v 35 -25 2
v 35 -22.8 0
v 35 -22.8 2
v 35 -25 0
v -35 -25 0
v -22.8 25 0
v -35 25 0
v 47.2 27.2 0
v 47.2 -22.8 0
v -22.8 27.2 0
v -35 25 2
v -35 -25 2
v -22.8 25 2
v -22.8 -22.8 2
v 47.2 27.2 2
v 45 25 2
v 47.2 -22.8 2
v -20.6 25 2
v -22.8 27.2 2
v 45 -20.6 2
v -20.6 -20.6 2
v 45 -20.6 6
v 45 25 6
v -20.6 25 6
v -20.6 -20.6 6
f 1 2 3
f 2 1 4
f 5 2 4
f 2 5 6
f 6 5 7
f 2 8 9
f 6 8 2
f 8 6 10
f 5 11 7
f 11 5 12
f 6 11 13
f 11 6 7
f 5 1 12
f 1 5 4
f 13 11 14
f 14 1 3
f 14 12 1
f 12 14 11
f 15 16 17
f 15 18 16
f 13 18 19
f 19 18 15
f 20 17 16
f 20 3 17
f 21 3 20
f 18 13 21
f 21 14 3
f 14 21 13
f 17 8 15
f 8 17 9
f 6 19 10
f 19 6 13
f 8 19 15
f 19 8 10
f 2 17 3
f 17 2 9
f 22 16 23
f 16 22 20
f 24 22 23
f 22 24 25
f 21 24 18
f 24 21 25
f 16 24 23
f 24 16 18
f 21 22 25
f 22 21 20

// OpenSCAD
// Two-part enclosure for small electronics board (e.g. Arduino-based temperature logger)
// Print orientation: box upright, lid upside down on the bed, 10 mm gap between them

// ---------------- Parameters ----------------
box_x      = 70;    // box outer size in X (mm)
box_y      = 50;    // box outer size in Y (mm)
box_z      = 30;    // box outer size in Z (mm)
box_wall   = 2;     // box wall thickness (mm)
box_floor  = 2;     // box floor thickness (mm)

lid_plate_x      = 70;   // lid plate size in X (mm)
lid_plate_y      = 50;   // lid plate size in Y (mm)
lid_plate_t      = 2;    // lid plate thickness (mm)

lip_outer_x      = 65.6; // lip outer size in X (mm)
lip_outer_y      = 45.6; // lip outer size in Y (mm)
lip_wall         = 1.5;  // lip wall thickness (mm)
lip_height       = 4;    // lip height above plate (mm)

clearance        = 0.2;  // clearance between lip inner size and box opening (mm)
gap_between      = 10;   // gap between box and lid (mm)
eps              = 0.5;  // cutter overshoot past faces (mm)

$fn = 64;

// Derived: lip inner size so it slides into the box opening
lip_in_x = box_x - 2*box_wall - 2*clearance;   // 65.6
lip_in_y = box_y - 2*box_wall - 2*clearance;   // 45.6

// ---------------- Model ----------------
union() {
    // Part 1: Box (open top)
    translate([-box_x/2, -box_y/2, 0])
        difference() {
            cube([box_x, box_y, box_z]);
            translate([0, 0, box_floor])
                cube([box_x, box_y, box_z - box_floor + eps]);  // open-top cut
        }

    // Part 2: Lid (plate with lip), printed upside down
    translate([(box_x - lip_outer_x)/2 + gap_between,
               (box_y - lip_outer_y)/2,
               0])
        union() {
            // Plate lying on the bed
            translate([-lid_plate_x/2, -lid_plate_y/2, 0])
                cube([lid_plate_x, lid_plate_y, lid_plate_t]);

            // Lip on top of the plate (extends upward, overhangs the plate)
            translate([-lip_outer_x/2, -lip_outer_y/2, lid_plate_t])
                cube([lip_outer_x, lip_outer_y, lip_height]);
        }
}
